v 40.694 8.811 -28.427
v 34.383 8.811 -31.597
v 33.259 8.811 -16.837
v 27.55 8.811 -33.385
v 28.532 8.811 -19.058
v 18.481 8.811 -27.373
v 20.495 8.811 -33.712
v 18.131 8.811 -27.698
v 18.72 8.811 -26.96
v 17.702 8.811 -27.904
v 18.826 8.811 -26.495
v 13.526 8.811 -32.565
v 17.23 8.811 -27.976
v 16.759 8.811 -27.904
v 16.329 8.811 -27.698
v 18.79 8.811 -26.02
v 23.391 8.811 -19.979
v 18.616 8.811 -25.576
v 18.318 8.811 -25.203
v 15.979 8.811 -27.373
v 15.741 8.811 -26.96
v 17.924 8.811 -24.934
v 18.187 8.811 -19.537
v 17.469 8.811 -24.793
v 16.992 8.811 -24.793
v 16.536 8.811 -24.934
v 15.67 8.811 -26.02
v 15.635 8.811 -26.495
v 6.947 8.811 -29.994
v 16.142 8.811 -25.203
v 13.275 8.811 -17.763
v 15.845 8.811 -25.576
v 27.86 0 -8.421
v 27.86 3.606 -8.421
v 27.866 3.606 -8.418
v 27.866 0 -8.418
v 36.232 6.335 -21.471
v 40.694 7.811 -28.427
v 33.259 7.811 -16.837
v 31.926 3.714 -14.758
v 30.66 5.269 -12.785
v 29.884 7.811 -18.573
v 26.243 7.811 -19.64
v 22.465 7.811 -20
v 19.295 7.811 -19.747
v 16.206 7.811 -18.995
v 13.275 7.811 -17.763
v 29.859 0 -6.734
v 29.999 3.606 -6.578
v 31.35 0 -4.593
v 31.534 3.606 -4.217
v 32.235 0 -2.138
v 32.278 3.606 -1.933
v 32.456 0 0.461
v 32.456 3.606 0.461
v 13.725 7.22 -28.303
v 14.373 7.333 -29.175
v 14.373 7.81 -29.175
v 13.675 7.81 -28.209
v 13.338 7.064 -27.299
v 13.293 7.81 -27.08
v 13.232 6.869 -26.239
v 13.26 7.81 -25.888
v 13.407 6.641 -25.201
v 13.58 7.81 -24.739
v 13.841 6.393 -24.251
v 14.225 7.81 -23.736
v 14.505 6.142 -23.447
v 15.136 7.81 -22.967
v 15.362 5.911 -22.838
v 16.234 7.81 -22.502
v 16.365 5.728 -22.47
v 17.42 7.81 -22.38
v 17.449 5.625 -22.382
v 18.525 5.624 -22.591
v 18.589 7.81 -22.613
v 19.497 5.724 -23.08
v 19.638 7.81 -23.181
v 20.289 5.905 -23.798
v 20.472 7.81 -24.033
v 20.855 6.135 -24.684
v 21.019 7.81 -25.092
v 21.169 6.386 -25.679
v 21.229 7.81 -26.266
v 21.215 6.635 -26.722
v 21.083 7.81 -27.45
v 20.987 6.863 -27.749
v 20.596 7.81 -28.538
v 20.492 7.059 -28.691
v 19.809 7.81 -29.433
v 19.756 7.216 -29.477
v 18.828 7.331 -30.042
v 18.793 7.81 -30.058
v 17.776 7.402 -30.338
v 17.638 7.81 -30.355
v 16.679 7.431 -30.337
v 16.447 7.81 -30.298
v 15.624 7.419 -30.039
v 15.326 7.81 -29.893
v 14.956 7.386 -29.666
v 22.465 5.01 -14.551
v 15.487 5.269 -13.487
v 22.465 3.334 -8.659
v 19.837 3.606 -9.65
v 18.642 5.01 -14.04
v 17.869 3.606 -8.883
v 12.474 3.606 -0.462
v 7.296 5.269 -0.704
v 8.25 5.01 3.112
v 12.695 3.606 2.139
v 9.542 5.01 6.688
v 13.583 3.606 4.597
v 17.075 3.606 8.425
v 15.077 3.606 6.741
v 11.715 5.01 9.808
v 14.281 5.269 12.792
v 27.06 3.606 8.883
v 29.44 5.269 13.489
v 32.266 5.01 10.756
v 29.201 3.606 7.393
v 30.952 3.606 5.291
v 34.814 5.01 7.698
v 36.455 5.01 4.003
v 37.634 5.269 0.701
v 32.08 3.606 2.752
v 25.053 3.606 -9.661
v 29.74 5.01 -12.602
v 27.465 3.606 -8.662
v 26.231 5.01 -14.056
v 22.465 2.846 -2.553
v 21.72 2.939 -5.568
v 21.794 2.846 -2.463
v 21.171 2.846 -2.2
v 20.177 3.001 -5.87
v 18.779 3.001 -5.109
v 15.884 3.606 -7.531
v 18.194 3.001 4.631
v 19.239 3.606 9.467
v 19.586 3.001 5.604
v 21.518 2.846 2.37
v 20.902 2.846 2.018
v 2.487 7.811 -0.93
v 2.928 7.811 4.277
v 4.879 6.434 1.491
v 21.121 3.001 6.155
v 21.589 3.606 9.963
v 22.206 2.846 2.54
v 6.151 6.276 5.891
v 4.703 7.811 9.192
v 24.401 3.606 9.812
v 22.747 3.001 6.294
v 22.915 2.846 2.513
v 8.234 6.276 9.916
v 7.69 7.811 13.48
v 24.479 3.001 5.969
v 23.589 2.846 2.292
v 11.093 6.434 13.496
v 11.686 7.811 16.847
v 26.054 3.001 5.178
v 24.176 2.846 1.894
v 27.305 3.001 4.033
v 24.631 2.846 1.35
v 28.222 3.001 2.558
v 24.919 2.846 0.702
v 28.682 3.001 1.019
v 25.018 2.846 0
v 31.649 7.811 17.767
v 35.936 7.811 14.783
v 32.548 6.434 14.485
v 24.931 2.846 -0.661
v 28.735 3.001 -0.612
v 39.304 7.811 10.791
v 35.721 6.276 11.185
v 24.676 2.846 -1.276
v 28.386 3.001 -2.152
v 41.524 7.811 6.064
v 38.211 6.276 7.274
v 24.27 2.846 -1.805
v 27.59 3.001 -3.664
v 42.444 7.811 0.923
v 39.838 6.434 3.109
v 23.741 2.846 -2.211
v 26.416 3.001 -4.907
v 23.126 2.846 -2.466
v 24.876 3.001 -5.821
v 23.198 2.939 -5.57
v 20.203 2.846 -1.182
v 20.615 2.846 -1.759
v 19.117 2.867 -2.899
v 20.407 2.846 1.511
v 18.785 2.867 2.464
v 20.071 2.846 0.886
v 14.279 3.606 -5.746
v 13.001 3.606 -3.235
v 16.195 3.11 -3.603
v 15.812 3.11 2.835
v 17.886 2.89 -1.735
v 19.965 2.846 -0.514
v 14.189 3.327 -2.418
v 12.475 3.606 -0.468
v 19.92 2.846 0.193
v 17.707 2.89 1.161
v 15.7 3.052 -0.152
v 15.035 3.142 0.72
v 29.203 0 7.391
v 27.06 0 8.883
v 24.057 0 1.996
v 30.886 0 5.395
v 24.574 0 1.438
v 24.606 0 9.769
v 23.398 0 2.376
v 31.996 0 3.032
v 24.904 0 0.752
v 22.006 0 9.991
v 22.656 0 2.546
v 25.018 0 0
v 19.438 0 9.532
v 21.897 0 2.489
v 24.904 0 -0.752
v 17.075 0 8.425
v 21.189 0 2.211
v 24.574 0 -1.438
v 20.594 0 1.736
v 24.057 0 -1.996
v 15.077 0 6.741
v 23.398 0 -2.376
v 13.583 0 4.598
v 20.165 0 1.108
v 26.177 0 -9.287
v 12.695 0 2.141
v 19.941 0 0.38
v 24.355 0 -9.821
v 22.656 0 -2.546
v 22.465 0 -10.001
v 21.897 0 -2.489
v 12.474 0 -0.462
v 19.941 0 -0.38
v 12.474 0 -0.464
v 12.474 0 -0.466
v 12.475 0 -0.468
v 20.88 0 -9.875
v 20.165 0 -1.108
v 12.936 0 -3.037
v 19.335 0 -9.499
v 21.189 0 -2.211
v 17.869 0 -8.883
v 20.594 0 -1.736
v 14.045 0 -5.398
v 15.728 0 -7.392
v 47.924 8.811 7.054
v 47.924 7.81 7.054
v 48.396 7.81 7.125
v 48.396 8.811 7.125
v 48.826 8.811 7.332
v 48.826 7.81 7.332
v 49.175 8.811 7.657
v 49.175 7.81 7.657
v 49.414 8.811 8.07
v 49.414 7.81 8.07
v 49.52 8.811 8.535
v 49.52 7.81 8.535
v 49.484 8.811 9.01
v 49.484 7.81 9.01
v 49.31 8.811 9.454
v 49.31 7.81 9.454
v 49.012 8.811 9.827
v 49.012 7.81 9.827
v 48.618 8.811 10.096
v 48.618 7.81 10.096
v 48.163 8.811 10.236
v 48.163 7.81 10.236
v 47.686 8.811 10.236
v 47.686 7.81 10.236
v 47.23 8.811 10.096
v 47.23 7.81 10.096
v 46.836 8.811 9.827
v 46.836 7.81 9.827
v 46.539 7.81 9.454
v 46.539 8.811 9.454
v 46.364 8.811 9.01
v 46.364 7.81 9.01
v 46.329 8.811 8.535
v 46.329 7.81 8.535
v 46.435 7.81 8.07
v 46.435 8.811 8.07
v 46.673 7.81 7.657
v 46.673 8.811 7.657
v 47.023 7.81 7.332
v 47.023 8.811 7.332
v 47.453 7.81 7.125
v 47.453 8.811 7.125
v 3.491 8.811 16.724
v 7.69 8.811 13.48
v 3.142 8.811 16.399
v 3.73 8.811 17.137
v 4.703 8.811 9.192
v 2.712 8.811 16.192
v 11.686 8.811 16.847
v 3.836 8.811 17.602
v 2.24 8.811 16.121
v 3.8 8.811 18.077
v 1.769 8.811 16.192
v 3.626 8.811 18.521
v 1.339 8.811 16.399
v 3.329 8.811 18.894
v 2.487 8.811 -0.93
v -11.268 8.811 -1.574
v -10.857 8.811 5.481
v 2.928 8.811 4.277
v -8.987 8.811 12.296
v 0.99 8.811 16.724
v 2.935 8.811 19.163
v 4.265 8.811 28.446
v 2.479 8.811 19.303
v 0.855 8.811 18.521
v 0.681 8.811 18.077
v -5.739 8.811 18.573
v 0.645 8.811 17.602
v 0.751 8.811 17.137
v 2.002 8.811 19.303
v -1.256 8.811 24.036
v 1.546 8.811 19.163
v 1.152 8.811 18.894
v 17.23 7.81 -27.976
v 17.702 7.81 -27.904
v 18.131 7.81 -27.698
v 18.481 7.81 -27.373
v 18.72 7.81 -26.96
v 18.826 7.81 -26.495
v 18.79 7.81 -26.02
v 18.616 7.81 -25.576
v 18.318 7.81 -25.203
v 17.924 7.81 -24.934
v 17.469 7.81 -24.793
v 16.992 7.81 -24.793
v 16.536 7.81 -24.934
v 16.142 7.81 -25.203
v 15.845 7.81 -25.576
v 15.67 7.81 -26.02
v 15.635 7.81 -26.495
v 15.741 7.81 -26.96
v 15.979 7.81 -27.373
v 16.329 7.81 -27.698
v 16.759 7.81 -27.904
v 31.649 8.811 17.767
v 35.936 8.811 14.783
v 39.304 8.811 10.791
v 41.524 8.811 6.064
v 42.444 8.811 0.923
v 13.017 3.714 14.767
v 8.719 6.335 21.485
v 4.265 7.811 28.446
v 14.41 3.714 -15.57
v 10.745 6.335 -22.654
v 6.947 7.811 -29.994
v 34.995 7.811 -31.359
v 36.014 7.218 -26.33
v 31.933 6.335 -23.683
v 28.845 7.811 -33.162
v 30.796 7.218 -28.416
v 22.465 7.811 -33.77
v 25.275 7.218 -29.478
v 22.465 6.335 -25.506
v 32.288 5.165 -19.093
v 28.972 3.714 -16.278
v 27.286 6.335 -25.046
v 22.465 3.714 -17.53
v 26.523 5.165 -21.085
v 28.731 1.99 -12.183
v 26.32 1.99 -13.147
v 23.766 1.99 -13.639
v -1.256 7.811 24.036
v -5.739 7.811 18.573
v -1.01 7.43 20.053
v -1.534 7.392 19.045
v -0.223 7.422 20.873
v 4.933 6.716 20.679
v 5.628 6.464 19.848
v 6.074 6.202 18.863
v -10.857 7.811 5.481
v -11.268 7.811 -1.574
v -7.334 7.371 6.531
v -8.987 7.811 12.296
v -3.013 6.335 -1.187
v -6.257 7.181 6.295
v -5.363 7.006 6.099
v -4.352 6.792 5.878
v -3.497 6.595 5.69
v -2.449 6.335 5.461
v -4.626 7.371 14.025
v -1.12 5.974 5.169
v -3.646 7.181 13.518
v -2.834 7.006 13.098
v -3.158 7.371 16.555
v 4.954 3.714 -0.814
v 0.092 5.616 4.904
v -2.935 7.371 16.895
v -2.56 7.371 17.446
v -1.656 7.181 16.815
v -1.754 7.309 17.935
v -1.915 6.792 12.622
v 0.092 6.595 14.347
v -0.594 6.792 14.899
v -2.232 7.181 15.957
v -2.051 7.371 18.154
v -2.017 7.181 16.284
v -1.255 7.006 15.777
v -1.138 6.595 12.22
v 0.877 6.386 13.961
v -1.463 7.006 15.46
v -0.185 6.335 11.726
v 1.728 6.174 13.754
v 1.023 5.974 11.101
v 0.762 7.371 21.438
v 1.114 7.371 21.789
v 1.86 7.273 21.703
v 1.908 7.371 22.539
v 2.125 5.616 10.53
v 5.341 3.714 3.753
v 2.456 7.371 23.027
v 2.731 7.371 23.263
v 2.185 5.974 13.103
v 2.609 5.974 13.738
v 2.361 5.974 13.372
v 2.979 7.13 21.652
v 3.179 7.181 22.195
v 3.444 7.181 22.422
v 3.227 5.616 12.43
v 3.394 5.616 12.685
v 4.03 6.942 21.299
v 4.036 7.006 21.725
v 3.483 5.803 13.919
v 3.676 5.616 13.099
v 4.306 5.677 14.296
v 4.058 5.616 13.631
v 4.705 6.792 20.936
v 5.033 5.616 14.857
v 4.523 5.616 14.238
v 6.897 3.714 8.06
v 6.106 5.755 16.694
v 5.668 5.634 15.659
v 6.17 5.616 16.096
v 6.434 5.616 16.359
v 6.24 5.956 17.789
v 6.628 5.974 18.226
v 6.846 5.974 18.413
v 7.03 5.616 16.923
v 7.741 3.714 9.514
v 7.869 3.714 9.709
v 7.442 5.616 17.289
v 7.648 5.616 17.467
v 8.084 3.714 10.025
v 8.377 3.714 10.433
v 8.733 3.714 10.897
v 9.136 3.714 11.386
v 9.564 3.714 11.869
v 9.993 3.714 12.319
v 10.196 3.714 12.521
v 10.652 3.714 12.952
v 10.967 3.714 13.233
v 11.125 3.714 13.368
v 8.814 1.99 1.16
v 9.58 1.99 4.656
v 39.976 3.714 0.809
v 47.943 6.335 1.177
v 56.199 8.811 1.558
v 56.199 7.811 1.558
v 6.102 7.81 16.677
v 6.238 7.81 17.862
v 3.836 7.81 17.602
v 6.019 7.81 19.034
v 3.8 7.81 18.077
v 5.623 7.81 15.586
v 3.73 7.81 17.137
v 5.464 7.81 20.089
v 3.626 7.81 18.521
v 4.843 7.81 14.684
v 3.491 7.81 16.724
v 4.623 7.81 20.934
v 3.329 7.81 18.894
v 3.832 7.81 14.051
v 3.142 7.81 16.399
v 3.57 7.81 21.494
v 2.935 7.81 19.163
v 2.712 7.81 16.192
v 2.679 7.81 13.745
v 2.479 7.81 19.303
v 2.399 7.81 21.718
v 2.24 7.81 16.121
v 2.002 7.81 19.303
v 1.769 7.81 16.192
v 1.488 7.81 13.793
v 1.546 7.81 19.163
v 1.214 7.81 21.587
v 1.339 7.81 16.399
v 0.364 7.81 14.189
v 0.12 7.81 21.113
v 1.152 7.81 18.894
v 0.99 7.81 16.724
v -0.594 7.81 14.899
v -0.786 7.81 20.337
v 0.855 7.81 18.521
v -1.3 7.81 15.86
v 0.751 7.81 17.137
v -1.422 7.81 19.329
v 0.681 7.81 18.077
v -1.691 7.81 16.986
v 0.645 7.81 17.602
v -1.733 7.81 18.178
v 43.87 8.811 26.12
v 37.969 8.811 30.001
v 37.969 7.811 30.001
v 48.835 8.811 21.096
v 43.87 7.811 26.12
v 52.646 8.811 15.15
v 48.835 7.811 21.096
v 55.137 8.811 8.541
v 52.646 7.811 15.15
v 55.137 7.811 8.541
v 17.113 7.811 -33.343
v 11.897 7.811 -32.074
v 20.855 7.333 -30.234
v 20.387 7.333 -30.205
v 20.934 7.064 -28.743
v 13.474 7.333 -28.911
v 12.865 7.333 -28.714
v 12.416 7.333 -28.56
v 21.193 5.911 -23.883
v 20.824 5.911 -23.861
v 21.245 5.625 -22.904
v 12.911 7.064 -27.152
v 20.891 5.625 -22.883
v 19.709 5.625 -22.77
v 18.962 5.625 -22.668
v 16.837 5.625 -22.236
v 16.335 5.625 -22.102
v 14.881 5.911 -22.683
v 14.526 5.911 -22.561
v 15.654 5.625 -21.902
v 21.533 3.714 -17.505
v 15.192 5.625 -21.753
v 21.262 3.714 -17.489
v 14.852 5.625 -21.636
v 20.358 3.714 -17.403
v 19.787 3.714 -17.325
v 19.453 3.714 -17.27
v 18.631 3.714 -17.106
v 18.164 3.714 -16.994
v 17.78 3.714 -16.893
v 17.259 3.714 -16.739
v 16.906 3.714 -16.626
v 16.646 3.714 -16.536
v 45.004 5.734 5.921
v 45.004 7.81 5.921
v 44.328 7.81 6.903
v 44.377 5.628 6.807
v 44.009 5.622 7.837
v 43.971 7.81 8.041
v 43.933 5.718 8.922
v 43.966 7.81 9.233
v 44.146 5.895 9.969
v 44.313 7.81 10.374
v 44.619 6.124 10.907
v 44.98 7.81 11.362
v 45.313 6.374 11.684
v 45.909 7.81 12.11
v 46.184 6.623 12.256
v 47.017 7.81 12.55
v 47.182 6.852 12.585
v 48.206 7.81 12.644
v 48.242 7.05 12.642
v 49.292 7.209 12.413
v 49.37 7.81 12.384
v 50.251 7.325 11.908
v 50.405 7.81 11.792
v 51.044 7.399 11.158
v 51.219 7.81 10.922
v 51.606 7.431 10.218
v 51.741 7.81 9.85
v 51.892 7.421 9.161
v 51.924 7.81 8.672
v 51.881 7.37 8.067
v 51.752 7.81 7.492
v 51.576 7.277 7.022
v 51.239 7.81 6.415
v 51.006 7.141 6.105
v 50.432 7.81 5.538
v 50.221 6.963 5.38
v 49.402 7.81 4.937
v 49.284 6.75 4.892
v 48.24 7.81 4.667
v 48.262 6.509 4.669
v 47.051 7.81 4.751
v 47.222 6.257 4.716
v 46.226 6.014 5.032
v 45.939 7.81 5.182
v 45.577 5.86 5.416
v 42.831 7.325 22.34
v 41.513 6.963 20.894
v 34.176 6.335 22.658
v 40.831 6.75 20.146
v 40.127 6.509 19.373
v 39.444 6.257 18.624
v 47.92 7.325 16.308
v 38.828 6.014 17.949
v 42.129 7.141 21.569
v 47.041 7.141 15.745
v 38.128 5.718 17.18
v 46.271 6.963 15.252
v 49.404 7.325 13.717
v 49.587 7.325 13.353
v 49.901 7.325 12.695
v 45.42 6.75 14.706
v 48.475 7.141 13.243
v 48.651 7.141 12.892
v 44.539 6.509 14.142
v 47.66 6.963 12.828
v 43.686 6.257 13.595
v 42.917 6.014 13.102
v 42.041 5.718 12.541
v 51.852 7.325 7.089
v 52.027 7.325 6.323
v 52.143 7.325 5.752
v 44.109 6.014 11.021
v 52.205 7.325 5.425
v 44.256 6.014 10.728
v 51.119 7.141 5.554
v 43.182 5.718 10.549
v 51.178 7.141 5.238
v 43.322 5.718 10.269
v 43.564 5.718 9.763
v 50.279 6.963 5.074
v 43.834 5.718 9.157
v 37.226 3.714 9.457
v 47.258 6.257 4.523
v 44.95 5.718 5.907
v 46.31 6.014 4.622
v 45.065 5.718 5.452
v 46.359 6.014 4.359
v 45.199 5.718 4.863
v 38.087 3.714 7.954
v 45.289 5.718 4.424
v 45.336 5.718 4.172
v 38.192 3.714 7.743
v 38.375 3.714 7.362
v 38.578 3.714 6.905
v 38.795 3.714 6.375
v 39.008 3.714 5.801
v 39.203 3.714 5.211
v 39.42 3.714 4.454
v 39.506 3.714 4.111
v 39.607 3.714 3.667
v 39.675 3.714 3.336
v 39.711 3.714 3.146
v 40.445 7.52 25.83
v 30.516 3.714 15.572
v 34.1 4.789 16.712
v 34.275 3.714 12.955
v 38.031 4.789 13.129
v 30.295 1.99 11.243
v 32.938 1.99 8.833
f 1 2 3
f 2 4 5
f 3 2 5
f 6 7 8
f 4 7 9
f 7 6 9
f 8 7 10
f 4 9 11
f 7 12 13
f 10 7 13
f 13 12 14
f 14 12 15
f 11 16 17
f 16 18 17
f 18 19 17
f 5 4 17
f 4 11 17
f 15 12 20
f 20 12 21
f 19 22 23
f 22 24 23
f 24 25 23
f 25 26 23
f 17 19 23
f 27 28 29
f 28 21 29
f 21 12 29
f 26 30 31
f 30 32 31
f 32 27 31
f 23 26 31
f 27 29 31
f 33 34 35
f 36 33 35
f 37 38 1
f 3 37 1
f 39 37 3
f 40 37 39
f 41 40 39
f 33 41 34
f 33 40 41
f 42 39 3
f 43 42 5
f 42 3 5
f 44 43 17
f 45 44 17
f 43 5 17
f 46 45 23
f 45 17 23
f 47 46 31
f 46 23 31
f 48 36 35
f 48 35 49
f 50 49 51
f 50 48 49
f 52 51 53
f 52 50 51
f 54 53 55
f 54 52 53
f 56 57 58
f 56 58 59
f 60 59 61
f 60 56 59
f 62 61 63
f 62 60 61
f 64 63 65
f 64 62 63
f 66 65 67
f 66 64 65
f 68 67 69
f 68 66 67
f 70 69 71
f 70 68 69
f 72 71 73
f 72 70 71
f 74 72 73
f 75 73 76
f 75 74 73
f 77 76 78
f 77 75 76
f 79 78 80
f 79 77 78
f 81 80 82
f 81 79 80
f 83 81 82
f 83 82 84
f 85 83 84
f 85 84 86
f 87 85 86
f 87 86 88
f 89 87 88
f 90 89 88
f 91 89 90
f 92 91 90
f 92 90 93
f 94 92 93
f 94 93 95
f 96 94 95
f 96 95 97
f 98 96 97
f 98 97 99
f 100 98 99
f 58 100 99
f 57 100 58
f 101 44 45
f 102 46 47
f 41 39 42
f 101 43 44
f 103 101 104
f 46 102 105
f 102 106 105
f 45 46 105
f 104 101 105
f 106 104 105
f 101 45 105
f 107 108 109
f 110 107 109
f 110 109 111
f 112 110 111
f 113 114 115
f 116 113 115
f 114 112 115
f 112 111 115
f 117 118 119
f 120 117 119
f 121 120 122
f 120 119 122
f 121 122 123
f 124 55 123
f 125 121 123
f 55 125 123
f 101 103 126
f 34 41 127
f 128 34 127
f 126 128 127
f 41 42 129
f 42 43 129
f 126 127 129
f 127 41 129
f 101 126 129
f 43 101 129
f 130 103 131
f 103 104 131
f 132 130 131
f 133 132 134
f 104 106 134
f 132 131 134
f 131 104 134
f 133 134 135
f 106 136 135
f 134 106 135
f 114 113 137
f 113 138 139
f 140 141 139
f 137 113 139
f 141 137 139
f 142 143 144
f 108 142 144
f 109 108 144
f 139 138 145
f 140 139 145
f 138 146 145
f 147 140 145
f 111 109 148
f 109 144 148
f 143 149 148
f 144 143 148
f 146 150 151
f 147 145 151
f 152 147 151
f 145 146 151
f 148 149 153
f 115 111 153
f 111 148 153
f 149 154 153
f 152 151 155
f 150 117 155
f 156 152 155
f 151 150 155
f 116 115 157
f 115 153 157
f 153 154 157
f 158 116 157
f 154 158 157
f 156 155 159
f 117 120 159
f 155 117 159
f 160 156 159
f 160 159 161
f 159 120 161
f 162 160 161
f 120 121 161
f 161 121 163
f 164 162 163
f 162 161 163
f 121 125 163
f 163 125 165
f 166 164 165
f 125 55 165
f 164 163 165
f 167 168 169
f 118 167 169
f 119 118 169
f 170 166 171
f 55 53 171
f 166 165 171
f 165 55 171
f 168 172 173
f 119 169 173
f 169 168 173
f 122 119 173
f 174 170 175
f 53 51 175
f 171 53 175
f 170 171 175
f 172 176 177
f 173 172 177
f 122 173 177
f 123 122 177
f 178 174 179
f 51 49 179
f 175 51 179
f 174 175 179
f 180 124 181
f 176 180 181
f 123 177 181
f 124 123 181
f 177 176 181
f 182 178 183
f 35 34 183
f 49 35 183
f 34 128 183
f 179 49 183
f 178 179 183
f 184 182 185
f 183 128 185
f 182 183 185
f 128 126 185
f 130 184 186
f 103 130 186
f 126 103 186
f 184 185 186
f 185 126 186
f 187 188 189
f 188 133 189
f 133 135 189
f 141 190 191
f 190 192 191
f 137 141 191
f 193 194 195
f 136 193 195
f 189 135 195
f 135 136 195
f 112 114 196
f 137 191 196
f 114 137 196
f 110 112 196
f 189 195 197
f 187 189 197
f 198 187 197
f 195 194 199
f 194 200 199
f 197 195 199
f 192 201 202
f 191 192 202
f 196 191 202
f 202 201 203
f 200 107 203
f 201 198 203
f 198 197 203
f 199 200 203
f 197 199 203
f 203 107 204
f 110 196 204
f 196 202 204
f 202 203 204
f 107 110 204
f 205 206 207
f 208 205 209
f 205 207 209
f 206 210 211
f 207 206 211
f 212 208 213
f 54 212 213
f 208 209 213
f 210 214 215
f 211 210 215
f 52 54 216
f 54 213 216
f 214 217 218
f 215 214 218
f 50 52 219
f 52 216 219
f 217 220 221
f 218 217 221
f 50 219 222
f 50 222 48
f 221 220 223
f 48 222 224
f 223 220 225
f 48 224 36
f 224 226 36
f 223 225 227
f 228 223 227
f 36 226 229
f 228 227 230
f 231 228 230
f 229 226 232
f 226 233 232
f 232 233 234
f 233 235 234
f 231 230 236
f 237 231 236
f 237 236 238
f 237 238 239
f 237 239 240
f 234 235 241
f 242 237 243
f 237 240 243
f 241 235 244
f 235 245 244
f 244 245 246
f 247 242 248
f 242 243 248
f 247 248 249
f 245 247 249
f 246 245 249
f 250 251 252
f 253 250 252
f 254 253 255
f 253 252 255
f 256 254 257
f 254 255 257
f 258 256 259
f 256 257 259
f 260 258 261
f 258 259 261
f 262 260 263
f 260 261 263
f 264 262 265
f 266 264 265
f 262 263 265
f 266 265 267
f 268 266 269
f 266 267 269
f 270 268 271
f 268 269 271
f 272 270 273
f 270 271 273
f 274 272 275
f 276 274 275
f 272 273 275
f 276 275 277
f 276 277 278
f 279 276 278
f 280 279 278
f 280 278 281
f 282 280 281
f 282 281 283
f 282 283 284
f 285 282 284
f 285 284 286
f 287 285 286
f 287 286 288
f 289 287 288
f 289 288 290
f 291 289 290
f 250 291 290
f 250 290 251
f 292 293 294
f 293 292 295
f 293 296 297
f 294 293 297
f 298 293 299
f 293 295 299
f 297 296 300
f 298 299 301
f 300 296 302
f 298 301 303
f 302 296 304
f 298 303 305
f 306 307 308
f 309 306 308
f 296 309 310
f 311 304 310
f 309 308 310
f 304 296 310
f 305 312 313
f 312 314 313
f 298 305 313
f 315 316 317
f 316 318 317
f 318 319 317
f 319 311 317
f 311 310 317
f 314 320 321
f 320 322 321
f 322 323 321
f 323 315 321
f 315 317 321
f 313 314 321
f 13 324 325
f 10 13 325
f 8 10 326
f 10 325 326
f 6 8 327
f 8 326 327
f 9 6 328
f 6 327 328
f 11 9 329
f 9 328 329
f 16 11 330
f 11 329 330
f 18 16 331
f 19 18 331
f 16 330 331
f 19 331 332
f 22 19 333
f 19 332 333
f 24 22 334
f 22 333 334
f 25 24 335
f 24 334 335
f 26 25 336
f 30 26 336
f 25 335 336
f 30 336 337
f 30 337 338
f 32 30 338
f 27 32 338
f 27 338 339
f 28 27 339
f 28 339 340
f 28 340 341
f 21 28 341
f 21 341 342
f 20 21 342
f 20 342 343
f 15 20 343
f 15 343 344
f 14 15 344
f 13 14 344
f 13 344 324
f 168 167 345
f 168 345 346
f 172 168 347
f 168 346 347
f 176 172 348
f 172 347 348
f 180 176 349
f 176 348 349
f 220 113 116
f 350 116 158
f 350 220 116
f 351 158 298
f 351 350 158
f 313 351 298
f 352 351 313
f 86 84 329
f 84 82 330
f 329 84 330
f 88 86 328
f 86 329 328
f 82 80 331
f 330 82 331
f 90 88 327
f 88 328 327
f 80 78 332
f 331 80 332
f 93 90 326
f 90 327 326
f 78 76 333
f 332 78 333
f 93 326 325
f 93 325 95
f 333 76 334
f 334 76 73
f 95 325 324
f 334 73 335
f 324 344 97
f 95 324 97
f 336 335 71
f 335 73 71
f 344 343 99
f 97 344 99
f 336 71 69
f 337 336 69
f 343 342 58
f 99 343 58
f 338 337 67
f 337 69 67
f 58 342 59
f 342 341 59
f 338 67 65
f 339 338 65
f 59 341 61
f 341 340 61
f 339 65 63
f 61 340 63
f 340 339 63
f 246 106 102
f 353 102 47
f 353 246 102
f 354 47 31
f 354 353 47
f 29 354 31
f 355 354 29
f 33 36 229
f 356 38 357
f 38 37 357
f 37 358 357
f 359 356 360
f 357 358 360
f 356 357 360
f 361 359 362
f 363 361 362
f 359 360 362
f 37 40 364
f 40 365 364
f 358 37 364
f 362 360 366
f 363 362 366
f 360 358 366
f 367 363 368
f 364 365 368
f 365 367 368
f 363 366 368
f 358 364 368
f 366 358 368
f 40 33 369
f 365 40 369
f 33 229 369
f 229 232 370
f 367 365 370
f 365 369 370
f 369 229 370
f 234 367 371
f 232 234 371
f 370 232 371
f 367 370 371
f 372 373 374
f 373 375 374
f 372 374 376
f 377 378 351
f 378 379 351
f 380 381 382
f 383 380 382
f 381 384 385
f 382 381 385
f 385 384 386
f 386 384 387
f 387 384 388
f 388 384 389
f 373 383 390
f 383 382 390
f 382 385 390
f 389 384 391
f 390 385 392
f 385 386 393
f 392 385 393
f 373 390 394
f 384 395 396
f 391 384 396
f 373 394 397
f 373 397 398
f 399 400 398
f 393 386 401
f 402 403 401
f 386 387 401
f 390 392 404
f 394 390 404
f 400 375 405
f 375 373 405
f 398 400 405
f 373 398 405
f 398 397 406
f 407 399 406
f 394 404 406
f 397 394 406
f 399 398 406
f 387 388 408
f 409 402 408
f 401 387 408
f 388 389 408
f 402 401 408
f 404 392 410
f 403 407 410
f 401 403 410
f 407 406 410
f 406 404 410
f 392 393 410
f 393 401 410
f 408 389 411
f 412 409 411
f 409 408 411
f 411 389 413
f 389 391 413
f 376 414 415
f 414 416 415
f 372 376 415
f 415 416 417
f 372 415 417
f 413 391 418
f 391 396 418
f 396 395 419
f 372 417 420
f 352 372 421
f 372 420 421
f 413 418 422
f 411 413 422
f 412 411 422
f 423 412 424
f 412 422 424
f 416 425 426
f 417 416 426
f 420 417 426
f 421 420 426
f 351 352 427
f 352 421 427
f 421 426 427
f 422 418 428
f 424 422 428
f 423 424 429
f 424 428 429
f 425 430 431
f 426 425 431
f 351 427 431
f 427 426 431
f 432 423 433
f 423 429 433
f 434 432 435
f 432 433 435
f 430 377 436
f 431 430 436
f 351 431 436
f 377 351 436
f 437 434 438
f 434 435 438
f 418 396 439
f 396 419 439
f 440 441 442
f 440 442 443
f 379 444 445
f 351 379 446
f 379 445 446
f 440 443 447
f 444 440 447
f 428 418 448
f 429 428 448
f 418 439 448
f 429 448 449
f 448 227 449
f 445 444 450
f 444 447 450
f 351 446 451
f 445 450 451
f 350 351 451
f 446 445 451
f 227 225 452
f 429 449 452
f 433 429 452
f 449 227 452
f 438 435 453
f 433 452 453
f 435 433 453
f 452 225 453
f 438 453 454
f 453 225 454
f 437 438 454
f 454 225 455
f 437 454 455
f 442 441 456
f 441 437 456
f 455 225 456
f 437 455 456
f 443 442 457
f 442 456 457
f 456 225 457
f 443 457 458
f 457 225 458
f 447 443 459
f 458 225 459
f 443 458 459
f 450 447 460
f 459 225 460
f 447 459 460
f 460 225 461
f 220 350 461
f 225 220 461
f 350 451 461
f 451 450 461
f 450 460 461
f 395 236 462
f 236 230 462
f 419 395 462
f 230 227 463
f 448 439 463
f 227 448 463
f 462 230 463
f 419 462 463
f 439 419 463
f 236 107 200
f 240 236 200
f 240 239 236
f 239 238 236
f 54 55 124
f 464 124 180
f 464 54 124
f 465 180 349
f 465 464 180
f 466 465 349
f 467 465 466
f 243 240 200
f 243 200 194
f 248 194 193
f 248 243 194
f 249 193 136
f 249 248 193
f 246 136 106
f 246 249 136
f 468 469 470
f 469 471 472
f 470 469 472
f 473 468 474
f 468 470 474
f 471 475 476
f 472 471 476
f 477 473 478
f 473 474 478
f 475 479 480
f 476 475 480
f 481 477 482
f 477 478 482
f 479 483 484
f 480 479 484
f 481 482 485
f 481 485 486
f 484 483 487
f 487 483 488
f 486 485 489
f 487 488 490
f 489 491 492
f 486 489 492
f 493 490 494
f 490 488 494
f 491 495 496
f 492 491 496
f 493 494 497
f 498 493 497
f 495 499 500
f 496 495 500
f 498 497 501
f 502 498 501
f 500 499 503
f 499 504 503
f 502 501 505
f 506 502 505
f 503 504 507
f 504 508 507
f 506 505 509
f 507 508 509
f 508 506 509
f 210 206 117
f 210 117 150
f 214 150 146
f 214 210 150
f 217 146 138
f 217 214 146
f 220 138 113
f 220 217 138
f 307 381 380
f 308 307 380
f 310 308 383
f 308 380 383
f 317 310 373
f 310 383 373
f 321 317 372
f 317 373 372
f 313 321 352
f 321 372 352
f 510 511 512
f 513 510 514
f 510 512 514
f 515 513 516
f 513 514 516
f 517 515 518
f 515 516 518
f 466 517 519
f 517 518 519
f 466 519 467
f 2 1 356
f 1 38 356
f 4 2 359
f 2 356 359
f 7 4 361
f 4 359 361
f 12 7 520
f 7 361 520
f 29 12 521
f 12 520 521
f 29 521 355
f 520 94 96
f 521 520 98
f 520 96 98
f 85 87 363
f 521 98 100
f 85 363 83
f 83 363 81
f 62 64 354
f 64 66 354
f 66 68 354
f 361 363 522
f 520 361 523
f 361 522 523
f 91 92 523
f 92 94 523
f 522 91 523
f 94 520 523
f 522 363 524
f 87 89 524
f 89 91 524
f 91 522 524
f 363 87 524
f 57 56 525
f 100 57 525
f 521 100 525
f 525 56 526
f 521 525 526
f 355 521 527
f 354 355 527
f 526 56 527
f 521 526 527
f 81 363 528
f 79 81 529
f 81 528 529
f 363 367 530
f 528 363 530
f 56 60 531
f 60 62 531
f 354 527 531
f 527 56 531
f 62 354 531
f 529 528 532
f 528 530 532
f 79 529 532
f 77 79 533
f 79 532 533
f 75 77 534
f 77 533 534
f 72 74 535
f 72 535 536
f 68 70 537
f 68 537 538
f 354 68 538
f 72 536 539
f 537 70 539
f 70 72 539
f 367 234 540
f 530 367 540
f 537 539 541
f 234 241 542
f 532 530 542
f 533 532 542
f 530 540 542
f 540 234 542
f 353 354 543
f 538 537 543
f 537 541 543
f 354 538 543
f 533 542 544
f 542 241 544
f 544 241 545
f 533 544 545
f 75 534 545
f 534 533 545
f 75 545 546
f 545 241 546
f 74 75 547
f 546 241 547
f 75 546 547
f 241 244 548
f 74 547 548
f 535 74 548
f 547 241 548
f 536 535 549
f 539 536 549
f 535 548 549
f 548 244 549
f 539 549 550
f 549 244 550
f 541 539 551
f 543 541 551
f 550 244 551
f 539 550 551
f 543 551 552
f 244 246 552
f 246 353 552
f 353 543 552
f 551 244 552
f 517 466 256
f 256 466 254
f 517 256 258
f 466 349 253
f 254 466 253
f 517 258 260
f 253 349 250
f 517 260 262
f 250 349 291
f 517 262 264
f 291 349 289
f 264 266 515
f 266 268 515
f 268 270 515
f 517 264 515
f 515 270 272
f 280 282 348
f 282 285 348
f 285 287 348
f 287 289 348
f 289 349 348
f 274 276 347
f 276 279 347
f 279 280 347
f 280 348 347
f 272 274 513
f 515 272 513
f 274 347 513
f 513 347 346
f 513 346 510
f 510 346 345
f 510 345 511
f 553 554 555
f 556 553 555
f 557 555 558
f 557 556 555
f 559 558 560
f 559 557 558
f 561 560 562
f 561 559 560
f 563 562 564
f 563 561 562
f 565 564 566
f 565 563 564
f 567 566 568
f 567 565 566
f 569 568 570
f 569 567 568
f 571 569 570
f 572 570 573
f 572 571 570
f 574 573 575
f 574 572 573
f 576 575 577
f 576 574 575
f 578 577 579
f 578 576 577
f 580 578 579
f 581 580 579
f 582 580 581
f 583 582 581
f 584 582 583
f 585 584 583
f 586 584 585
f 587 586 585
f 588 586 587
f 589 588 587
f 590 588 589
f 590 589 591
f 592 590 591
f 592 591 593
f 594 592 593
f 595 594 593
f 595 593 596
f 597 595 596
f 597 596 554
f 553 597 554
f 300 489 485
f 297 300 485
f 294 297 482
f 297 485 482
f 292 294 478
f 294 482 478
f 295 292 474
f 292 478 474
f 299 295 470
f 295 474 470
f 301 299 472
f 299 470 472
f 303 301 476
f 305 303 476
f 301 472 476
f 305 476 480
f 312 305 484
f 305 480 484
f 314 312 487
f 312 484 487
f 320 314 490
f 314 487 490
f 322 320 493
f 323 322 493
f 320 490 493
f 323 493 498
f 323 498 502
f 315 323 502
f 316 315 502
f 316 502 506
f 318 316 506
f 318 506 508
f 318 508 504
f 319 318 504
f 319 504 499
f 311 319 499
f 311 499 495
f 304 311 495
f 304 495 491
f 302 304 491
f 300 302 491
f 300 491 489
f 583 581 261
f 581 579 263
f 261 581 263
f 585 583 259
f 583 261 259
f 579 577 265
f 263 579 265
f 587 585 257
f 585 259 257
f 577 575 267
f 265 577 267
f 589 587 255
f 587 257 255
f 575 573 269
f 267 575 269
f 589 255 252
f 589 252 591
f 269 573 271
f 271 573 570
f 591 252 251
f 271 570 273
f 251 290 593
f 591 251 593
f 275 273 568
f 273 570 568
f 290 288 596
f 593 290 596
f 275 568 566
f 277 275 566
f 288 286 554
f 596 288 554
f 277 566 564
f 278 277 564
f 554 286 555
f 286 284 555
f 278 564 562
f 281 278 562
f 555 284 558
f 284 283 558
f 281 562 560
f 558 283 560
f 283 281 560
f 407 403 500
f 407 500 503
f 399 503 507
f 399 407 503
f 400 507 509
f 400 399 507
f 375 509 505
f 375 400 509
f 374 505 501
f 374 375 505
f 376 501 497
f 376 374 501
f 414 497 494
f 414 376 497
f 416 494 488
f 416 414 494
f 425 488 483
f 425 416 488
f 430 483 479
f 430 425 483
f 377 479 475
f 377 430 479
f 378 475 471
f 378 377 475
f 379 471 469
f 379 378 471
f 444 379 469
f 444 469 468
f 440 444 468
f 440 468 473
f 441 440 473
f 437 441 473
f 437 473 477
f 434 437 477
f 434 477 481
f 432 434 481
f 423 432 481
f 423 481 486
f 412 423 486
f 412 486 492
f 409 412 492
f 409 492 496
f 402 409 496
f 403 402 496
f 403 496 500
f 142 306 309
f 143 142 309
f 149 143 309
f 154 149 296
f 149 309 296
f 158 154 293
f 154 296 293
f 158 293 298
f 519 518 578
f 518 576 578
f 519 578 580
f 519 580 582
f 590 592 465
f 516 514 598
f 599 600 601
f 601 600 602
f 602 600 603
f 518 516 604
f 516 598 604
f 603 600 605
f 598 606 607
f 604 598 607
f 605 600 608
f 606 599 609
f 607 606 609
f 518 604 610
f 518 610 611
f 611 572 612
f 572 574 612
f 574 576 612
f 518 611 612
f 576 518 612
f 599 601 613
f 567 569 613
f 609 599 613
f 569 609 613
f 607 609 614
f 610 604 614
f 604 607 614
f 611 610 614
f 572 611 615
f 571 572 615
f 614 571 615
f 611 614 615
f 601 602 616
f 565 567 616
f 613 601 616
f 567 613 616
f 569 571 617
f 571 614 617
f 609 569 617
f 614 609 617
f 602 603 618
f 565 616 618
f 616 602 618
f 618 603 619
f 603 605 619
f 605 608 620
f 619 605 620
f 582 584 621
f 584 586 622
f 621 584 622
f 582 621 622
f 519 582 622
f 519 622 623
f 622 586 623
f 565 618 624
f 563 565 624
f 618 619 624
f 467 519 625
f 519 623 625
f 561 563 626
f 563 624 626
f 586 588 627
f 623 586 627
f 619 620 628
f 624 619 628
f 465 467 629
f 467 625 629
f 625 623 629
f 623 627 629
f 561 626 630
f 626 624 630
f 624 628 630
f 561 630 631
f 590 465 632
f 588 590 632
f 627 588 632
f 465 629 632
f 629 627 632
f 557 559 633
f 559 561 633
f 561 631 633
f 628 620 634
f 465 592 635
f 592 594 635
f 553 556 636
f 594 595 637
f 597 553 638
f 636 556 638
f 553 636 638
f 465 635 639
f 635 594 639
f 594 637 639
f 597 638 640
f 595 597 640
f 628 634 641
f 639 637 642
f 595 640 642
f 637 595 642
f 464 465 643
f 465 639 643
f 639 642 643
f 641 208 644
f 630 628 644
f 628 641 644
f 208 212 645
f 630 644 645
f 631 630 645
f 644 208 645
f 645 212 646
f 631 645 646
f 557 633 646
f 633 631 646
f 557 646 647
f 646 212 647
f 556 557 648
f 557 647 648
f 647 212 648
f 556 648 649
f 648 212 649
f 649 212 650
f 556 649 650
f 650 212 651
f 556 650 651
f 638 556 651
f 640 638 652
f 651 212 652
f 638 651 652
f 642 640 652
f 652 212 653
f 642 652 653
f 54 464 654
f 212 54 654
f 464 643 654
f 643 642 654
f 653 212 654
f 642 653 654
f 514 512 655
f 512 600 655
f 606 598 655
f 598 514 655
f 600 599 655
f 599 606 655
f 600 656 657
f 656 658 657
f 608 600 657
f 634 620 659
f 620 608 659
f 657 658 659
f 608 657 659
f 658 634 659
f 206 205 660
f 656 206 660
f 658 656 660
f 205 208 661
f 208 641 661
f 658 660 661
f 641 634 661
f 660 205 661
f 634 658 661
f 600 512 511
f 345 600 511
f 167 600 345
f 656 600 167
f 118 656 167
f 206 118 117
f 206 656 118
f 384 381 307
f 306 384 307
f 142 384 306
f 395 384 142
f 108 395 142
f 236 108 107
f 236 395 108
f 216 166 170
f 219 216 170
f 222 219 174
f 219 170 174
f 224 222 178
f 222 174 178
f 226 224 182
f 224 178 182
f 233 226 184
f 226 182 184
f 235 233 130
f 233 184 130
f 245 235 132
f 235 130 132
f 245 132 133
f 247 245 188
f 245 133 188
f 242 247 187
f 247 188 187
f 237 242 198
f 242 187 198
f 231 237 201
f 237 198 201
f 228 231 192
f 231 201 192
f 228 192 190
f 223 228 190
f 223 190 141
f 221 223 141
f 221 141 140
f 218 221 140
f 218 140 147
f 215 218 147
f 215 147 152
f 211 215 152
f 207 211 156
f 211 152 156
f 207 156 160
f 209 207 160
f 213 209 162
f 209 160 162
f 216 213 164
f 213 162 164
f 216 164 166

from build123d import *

# Parameters (mm, degrees)
SKETCH6_R               = 1.6
CUT_EXTRUDE3_DEPTH      = 25.4
F_1_4_20_TAPPED_HOLE2_D = 5.1054
SKETCH20_R              = 4
CUT_EXTRUDE4_DEPTH      = 7.81


with BuildPart() as part:
    # Sketch1 → Revolve3 (revolve)
    with BuildSketch(Plane.XY, mode=Mode.PRIVATE) as revolve3_sk:
        with BuildLine():
            Line((12.463542917, 0), (22.464939564, 0))
            Line((22.464939564, 0), (22.464939564, 3))
            ThreePointArc((22.464939564, 3), (12.055156212, 3.701585346), (2.464939564, 7.810545811))
            Line((2.464939564, 7.810545811), (2.464939564, 8.810545811))
            Line((2.464939564, 8.810545811), (-11.305060436, 8.810545811))
            Line((-11.305060436, 8.810545811), (-11.305060436, 7.810545811))
            ThreePointArc((-11.305060436, 7.810545811), (0.993128192, 5.164789847), (12.463542917, 0))
        make_face()
    revolve(revolve3_sk.sketch.rotate(Axis((22.464939564, 0, 0), (0, 1, 0)), 270), axis=Axis((22.464939564, 0, 0), (0, 1, 0)))

    # Sketch6 → Cut-Extrude3 (cut)
    with BuildSketch(Plane(origin=(0, 0, 0), x_dir=(-1, 0, 0), z_dir=(0, -1, 0))):
        with Locations(Location((-2.240445209, -17.721228176, 0), (0, 0, 90))):
            Circle(SKETCH6_R)
        with Locations(Location((-47.924220529, -8.654311802, 0), (0, 0, 90))):
            Circle(SKETCH6_R)
        with Locations(Location((-17.230152955, 26.375539978, 0), (0, 0, 90))):
            Circle(SKETCH6_R)
        with BuildLine():
            Line((-17.074884782, -8.424681994), (-2.715259327, -30.868846833))
            ThreePointArc((-2.715259327, -30.868846833), (-20.776195295, -36.607153906), (-39.28873242, -32.556037354))
            Line((-39.28873242, -32.556037354), (-27.060394573, -8.883116036))
            ThreePointArc((-27.060394573, -8.883116036), (-22.006259237, -9.990874316), (-17.074884782, -8.424681994))
        make_face()
        with BuildLine():
            Line((-32.455682979, -0.461498547), (-58.753919723, -1.676282828))
            Line((-58.753919723, -1.676282828), (-59.072986342, -1.669301437))
            ThreePointArc((-59.072986342, -1.669301437), (-55.012037933, 16.841082029), (-42.247399134, 30.847851619))
            Line((-42.247399134, 30.847851619), (-27.860216814, 8.421339739))
            Line((-27.860216814, 8.421339739), (-27.865844062, 8.417729237))
            ThreePointArc((-27.865844062, 8.417729237), (-31.349526098, 4.592608955), (-32.455682979, -0.461498547))
        make_face()
        with BuildLine():
            Line((-17.869237322, 8.882986874), (-5.772152998, 32.265320109))
            Line((-5.772152998, 32.265320109), (-5.606573626, 32.538149211))
            ThreePointArc((-5.606573626, 32.538149211), (8.393414485, 19.766072993), (14.141313375, 1.708186727))
            Line((14.141313375, 1.708186727), (-12.474206792, 0.46177729))
            Line((-12.474206792, 0.46177729), (-12.474519954, 0.46845588))
            ThreePointArc((-12.474519954, 0.46845588), (-14.045330272, 5.397973163), (-17.869237322, 8.882986874))
        make_face()
    extrude(amount=-CUT_EXTRUDE3_DEPTH, mode=Mode.SUBTRACT)

    # 1/4-20 Tapped Hole2 (through all)
    with Locations(Plane(origin=(0, 0, 0), x_dir=(-1, 0, 0), z_dir=(0, -1, 0))):
        with Locations((-22.464939564, 0)):
            Hole(F_1_4_20_TAPPED_HOLE2_D / 2)

    # Sketch20 → Cut-Extrude4 (cut)
    with BuildSketch(Plane(origin=(0, 0, 0), x_dir=(1, 0, 0), z_dir=(0, 1, 0))):
        with Locations(Location((2.240445209, -17.721228176, 0), (0, 0, 135.127097567))):
            Circle(SKETCH20_R)
        with Locations(Location((17.230152955, 26.375539978, 0), (0, 0, 135.575274994))):
            Circle(SKETCH20_R)
        with Locations(Location((47.924220529, -8.654311802, 0), (0, 0, 136.896542352))):
            Circle(SKETCH20_R)
    extrude(amount=CUT_EXTRUDE4_DEPTH, mode=Mode.SUBTRACT)


solid = part.part
